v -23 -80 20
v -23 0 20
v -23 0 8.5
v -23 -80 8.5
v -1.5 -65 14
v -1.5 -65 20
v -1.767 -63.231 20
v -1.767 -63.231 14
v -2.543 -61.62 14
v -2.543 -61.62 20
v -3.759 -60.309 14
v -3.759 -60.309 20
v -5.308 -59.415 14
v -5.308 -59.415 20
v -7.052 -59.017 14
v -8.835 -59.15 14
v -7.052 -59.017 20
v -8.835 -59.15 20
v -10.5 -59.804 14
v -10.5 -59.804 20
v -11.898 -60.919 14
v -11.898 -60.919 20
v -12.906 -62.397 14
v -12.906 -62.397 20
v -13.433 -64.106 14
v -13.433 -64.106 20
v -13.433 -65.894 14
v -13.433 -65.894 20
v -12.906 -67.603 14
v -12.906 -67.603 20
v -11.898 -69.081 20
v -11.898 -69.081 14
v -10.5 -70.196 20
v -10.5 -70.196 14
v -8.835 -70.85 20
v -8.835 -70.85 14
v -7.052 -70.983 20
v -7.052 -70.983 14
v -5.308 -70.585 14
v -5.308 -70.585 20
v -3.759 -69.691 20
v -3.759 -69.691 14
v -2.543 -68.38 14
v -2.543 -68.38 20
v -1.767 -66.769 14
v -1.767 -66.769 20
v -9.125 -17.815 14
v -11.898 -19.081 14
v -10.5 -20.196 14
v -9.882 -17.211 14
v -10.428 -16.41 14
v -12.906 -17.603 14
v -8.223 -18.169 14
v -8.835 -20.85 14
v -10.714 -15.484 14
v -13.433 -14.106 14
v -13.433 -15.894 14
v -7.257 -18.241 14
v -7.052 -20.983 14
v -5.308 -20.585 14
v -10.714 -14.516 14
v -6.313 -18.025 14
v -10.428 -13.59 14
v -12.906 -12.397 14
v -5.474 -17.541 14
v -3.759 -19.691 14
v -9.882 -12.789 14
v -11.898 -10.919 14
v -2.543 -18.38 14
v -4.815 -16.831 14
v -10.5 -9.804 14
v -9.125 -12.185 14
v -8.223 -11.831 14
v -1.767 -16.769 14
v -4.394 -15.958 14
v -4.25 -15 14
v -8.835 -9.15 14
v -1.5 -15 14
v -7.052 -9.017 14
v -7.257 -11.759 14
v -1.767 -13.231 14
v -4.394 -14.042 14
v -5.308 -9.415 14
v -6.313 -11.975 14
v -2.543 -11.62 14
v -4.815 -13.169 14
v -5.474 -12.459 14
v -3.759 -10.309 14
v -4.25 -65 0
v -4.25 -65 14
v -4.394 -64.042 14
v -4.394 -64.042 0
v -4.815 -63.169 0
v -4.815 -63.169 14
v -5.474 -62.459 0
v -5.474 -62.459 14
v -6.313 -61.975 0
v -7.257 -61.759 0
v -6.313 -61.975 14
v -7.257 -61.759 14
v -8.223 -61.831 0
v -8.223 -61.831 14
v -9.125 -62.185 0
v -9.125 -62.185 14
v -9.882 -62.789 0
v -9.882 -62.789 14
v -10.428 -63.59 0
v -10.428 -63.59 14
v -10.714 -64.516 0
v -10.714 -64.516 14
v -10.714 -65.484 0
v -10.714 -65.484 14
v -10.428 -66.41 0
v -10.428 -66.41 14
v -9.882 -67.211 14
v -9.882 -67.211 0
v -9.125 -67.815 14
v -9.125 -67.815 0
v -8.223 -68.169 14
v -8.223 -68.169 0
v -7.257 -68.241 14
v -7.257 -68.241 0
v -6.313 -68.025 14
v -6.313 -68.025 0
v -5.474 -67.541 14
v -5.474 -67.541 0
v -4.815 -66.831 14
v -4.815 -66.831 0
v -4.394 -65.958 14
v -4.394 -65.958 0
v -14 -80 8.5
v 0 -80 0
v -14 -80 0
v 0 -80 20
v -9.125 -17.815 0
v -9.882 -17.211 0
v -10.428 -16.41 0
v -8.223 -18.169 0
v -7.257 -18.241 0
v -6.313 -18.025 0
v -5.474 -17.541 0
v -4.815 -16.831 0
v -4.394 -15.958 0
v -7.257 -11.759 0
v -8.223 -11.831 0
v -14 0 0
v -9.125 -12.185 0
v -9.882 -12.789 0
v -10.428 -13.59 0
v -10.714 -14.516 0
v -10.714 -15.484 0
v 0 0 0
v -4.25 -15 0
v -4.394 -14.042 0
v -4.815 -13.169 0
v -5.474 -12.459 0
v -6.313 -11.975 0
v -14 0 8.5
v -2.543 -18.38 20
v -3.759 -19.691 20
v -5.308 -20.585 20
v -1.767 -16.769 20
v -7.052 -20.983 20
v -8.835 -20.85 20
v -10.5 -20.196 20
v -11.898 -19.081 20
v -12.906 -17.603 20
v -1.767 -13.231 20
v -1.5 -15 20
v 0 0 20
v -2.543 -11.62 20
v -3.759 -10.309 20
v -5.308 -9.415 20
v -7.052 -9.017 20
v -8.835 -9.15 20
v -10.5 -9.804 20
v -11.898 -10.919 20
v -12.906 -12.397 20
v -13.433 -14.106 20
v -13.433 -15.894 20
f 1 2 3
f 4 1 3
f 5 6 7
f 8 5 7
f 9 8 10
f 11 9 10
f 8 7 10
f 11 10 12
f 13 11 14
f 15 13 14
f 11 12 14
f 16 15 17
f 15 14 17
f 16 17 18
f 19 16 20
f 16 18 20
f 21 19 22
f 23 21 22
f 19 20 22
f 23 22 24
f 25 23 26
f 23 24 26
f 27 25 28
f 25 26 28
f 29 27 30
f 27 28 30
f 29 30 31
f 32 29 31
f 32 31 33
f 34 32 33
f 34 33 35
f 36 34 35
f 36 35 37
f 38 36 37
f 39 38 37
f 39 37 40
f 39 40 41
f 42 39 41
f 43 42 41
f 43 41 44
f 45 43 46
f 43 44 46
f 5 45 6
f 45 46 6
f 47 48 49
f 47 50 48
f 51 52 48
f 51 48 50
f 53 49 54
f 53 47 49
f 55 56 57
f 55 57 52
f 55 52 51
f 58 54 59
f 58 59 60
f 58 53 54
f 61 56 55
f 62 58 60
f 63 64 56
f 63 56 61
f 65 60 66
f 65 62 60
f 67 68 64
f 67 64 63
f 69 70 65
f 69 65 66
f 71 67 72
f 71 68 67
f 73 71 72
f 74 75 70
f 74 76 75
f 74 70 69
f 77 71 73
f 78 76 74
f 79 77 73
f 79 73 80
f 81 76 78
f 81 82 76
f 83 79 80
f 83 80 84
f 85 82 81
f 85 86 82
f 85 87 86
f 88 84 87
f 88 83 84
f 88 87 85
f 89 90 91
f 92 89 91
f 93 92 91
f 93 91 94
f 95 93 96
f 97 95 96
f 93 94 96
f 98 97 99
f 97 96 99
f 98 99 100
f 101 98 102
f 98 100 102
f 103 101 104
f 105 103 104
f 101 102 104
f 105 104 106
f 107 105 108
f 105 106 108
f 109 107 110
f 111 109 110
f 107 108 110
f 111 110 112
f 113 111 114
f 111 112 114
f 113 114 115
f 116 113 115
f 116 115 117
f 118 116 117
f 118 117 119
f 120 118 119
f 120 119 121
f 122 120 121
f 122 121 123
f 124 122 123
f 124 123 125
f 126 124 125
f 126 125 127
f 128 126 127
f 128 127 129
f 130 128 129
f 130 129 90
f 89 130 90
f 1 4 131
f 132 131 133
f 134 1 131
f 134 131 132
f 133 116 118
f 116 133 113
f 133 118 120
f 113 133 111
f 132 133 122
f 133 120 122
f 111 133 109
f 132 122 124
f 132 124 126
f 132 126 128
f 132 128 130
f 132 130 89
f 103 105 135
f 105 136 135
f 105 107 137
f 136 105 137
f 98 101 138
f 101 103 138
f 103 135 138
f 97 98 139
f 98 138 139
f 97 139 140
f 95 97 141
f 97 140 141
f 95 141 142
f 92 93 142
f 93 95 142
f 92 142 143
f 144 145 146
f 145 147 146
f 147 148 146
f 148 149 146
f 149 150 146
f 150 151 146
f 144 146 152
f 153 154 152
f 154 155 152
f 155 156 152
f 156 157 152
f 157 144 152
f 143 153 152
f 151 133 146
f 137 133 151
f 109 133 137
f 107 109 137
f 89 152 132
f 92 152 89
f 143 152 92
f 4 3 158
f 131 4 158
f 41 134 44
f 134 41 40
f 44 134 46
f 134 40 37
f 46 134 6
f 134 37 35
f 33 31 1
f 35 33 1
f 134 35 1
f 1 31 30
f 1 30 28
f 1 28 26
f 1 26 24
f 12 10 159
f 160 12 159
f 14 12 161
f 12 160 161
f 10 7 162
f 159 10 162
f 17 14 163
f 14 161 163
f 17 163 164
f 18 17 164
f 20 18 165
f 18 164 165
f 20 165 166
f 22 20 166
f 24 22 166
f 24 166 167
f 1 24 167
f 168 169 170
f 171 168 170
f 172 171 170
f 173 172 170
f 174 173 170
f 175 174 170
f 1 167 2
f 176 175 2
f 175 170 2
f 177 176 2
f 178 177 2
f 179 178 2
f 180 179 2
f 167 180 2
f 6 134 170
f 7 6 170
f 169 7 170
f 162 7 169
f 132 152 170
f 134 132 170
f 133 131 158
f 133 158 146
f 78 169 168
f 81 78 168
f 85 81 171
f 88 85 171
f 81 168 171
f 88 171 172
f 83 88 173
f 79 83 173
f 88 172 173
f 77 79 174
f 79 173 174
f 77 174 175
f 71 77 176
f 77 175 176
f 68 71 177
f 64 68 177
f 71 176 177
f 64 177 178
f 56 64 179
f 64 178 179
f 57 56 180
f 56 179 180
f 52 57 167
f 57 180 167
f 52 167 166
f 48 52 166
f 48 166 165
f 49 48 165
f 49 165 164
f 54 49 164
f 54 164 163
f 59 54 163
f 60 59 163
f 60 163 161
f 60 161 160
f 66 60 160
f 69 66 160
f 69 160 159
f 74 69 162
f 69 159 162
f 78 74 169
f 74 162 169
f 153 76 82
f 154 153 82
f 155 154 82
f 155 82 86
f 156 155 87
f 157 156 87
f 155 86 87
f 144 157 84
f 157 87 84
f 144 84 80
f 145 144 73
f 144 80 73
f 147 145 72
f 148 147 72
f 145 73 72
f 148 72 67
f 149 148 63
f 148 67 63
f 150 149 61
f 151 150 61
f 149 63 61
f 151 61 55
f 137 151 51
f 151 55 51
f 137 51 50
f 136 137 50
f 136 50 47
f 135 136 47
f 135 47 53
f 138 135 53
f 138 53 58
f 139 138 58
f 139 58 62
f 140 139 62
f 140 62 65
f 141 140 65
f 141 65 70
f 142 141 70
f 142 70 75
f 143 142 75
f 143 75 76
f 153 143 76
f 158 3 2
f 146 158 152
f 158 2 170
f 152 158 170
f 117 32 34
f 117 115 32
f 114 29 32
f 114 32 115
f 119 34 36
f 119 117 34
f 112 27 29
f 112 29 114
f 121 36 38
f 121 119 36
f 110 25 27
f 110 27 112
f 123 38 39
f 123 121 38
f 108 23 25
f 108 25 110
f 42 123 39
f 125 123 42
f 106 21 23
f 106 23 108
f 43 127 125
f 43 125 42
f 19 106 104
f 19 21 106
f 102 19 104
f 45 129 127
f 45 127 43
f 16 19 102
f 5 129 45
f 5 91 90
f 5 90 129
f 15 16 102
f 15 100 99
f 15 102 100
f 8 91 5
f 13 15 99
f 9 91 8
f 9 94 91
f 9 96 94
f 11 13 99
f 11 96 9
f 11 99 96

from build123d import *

# Parameters (mm, degrees)
F1_DEPTH = 80
F2_R     = 3.25
F3_DEPTH = 20.001
F4_R     = 6
F4_R_2   = 3.25
F5_DEPTH = 6


with BuildPart() as f1:
    # F0 (on Front) → F1 (new body)
    with BuildSketch(Plane.XZ):
        Polygon((-14, 0), (0, 0), (0, 20), (-23, 20), (-23, 8.5), (-14, 8.5), align=None)
    extrude(amount=F1_DEPTH)

    # F2 (on face) → F3 (cut, through all)
    with BuildSketch(Plane.XY.offset(20)):
        with Locations((-7.5, -15)):
            Circle(F2_R)
        with Locations((-7.5, -65)):
            Circle(F2_R)
    extrude(amount=-F3_DEPTH, mode=Mode.SUBTRACT)

    # F4 (on face) → F5 (cut)
    with BuildSketch(Plane.XY.offset(20)):
        with Locations((-7.5, -15)):
            Circle(F4_R)
        with Locations((-7.5, -15)):
            Circle(F4_R_2, mode=Mode.SUBTRACT)
        with Locations((-7.5, -65)):
            Circle(F4_R)
        with Locations((-7.5, -65)):
            Circle(F4_R_2, mode=Mode.SUBTRACT)
    extrude(amount=-F5_DEPTH, mode=Mode.SUBTRACT)


solid = f1.part
